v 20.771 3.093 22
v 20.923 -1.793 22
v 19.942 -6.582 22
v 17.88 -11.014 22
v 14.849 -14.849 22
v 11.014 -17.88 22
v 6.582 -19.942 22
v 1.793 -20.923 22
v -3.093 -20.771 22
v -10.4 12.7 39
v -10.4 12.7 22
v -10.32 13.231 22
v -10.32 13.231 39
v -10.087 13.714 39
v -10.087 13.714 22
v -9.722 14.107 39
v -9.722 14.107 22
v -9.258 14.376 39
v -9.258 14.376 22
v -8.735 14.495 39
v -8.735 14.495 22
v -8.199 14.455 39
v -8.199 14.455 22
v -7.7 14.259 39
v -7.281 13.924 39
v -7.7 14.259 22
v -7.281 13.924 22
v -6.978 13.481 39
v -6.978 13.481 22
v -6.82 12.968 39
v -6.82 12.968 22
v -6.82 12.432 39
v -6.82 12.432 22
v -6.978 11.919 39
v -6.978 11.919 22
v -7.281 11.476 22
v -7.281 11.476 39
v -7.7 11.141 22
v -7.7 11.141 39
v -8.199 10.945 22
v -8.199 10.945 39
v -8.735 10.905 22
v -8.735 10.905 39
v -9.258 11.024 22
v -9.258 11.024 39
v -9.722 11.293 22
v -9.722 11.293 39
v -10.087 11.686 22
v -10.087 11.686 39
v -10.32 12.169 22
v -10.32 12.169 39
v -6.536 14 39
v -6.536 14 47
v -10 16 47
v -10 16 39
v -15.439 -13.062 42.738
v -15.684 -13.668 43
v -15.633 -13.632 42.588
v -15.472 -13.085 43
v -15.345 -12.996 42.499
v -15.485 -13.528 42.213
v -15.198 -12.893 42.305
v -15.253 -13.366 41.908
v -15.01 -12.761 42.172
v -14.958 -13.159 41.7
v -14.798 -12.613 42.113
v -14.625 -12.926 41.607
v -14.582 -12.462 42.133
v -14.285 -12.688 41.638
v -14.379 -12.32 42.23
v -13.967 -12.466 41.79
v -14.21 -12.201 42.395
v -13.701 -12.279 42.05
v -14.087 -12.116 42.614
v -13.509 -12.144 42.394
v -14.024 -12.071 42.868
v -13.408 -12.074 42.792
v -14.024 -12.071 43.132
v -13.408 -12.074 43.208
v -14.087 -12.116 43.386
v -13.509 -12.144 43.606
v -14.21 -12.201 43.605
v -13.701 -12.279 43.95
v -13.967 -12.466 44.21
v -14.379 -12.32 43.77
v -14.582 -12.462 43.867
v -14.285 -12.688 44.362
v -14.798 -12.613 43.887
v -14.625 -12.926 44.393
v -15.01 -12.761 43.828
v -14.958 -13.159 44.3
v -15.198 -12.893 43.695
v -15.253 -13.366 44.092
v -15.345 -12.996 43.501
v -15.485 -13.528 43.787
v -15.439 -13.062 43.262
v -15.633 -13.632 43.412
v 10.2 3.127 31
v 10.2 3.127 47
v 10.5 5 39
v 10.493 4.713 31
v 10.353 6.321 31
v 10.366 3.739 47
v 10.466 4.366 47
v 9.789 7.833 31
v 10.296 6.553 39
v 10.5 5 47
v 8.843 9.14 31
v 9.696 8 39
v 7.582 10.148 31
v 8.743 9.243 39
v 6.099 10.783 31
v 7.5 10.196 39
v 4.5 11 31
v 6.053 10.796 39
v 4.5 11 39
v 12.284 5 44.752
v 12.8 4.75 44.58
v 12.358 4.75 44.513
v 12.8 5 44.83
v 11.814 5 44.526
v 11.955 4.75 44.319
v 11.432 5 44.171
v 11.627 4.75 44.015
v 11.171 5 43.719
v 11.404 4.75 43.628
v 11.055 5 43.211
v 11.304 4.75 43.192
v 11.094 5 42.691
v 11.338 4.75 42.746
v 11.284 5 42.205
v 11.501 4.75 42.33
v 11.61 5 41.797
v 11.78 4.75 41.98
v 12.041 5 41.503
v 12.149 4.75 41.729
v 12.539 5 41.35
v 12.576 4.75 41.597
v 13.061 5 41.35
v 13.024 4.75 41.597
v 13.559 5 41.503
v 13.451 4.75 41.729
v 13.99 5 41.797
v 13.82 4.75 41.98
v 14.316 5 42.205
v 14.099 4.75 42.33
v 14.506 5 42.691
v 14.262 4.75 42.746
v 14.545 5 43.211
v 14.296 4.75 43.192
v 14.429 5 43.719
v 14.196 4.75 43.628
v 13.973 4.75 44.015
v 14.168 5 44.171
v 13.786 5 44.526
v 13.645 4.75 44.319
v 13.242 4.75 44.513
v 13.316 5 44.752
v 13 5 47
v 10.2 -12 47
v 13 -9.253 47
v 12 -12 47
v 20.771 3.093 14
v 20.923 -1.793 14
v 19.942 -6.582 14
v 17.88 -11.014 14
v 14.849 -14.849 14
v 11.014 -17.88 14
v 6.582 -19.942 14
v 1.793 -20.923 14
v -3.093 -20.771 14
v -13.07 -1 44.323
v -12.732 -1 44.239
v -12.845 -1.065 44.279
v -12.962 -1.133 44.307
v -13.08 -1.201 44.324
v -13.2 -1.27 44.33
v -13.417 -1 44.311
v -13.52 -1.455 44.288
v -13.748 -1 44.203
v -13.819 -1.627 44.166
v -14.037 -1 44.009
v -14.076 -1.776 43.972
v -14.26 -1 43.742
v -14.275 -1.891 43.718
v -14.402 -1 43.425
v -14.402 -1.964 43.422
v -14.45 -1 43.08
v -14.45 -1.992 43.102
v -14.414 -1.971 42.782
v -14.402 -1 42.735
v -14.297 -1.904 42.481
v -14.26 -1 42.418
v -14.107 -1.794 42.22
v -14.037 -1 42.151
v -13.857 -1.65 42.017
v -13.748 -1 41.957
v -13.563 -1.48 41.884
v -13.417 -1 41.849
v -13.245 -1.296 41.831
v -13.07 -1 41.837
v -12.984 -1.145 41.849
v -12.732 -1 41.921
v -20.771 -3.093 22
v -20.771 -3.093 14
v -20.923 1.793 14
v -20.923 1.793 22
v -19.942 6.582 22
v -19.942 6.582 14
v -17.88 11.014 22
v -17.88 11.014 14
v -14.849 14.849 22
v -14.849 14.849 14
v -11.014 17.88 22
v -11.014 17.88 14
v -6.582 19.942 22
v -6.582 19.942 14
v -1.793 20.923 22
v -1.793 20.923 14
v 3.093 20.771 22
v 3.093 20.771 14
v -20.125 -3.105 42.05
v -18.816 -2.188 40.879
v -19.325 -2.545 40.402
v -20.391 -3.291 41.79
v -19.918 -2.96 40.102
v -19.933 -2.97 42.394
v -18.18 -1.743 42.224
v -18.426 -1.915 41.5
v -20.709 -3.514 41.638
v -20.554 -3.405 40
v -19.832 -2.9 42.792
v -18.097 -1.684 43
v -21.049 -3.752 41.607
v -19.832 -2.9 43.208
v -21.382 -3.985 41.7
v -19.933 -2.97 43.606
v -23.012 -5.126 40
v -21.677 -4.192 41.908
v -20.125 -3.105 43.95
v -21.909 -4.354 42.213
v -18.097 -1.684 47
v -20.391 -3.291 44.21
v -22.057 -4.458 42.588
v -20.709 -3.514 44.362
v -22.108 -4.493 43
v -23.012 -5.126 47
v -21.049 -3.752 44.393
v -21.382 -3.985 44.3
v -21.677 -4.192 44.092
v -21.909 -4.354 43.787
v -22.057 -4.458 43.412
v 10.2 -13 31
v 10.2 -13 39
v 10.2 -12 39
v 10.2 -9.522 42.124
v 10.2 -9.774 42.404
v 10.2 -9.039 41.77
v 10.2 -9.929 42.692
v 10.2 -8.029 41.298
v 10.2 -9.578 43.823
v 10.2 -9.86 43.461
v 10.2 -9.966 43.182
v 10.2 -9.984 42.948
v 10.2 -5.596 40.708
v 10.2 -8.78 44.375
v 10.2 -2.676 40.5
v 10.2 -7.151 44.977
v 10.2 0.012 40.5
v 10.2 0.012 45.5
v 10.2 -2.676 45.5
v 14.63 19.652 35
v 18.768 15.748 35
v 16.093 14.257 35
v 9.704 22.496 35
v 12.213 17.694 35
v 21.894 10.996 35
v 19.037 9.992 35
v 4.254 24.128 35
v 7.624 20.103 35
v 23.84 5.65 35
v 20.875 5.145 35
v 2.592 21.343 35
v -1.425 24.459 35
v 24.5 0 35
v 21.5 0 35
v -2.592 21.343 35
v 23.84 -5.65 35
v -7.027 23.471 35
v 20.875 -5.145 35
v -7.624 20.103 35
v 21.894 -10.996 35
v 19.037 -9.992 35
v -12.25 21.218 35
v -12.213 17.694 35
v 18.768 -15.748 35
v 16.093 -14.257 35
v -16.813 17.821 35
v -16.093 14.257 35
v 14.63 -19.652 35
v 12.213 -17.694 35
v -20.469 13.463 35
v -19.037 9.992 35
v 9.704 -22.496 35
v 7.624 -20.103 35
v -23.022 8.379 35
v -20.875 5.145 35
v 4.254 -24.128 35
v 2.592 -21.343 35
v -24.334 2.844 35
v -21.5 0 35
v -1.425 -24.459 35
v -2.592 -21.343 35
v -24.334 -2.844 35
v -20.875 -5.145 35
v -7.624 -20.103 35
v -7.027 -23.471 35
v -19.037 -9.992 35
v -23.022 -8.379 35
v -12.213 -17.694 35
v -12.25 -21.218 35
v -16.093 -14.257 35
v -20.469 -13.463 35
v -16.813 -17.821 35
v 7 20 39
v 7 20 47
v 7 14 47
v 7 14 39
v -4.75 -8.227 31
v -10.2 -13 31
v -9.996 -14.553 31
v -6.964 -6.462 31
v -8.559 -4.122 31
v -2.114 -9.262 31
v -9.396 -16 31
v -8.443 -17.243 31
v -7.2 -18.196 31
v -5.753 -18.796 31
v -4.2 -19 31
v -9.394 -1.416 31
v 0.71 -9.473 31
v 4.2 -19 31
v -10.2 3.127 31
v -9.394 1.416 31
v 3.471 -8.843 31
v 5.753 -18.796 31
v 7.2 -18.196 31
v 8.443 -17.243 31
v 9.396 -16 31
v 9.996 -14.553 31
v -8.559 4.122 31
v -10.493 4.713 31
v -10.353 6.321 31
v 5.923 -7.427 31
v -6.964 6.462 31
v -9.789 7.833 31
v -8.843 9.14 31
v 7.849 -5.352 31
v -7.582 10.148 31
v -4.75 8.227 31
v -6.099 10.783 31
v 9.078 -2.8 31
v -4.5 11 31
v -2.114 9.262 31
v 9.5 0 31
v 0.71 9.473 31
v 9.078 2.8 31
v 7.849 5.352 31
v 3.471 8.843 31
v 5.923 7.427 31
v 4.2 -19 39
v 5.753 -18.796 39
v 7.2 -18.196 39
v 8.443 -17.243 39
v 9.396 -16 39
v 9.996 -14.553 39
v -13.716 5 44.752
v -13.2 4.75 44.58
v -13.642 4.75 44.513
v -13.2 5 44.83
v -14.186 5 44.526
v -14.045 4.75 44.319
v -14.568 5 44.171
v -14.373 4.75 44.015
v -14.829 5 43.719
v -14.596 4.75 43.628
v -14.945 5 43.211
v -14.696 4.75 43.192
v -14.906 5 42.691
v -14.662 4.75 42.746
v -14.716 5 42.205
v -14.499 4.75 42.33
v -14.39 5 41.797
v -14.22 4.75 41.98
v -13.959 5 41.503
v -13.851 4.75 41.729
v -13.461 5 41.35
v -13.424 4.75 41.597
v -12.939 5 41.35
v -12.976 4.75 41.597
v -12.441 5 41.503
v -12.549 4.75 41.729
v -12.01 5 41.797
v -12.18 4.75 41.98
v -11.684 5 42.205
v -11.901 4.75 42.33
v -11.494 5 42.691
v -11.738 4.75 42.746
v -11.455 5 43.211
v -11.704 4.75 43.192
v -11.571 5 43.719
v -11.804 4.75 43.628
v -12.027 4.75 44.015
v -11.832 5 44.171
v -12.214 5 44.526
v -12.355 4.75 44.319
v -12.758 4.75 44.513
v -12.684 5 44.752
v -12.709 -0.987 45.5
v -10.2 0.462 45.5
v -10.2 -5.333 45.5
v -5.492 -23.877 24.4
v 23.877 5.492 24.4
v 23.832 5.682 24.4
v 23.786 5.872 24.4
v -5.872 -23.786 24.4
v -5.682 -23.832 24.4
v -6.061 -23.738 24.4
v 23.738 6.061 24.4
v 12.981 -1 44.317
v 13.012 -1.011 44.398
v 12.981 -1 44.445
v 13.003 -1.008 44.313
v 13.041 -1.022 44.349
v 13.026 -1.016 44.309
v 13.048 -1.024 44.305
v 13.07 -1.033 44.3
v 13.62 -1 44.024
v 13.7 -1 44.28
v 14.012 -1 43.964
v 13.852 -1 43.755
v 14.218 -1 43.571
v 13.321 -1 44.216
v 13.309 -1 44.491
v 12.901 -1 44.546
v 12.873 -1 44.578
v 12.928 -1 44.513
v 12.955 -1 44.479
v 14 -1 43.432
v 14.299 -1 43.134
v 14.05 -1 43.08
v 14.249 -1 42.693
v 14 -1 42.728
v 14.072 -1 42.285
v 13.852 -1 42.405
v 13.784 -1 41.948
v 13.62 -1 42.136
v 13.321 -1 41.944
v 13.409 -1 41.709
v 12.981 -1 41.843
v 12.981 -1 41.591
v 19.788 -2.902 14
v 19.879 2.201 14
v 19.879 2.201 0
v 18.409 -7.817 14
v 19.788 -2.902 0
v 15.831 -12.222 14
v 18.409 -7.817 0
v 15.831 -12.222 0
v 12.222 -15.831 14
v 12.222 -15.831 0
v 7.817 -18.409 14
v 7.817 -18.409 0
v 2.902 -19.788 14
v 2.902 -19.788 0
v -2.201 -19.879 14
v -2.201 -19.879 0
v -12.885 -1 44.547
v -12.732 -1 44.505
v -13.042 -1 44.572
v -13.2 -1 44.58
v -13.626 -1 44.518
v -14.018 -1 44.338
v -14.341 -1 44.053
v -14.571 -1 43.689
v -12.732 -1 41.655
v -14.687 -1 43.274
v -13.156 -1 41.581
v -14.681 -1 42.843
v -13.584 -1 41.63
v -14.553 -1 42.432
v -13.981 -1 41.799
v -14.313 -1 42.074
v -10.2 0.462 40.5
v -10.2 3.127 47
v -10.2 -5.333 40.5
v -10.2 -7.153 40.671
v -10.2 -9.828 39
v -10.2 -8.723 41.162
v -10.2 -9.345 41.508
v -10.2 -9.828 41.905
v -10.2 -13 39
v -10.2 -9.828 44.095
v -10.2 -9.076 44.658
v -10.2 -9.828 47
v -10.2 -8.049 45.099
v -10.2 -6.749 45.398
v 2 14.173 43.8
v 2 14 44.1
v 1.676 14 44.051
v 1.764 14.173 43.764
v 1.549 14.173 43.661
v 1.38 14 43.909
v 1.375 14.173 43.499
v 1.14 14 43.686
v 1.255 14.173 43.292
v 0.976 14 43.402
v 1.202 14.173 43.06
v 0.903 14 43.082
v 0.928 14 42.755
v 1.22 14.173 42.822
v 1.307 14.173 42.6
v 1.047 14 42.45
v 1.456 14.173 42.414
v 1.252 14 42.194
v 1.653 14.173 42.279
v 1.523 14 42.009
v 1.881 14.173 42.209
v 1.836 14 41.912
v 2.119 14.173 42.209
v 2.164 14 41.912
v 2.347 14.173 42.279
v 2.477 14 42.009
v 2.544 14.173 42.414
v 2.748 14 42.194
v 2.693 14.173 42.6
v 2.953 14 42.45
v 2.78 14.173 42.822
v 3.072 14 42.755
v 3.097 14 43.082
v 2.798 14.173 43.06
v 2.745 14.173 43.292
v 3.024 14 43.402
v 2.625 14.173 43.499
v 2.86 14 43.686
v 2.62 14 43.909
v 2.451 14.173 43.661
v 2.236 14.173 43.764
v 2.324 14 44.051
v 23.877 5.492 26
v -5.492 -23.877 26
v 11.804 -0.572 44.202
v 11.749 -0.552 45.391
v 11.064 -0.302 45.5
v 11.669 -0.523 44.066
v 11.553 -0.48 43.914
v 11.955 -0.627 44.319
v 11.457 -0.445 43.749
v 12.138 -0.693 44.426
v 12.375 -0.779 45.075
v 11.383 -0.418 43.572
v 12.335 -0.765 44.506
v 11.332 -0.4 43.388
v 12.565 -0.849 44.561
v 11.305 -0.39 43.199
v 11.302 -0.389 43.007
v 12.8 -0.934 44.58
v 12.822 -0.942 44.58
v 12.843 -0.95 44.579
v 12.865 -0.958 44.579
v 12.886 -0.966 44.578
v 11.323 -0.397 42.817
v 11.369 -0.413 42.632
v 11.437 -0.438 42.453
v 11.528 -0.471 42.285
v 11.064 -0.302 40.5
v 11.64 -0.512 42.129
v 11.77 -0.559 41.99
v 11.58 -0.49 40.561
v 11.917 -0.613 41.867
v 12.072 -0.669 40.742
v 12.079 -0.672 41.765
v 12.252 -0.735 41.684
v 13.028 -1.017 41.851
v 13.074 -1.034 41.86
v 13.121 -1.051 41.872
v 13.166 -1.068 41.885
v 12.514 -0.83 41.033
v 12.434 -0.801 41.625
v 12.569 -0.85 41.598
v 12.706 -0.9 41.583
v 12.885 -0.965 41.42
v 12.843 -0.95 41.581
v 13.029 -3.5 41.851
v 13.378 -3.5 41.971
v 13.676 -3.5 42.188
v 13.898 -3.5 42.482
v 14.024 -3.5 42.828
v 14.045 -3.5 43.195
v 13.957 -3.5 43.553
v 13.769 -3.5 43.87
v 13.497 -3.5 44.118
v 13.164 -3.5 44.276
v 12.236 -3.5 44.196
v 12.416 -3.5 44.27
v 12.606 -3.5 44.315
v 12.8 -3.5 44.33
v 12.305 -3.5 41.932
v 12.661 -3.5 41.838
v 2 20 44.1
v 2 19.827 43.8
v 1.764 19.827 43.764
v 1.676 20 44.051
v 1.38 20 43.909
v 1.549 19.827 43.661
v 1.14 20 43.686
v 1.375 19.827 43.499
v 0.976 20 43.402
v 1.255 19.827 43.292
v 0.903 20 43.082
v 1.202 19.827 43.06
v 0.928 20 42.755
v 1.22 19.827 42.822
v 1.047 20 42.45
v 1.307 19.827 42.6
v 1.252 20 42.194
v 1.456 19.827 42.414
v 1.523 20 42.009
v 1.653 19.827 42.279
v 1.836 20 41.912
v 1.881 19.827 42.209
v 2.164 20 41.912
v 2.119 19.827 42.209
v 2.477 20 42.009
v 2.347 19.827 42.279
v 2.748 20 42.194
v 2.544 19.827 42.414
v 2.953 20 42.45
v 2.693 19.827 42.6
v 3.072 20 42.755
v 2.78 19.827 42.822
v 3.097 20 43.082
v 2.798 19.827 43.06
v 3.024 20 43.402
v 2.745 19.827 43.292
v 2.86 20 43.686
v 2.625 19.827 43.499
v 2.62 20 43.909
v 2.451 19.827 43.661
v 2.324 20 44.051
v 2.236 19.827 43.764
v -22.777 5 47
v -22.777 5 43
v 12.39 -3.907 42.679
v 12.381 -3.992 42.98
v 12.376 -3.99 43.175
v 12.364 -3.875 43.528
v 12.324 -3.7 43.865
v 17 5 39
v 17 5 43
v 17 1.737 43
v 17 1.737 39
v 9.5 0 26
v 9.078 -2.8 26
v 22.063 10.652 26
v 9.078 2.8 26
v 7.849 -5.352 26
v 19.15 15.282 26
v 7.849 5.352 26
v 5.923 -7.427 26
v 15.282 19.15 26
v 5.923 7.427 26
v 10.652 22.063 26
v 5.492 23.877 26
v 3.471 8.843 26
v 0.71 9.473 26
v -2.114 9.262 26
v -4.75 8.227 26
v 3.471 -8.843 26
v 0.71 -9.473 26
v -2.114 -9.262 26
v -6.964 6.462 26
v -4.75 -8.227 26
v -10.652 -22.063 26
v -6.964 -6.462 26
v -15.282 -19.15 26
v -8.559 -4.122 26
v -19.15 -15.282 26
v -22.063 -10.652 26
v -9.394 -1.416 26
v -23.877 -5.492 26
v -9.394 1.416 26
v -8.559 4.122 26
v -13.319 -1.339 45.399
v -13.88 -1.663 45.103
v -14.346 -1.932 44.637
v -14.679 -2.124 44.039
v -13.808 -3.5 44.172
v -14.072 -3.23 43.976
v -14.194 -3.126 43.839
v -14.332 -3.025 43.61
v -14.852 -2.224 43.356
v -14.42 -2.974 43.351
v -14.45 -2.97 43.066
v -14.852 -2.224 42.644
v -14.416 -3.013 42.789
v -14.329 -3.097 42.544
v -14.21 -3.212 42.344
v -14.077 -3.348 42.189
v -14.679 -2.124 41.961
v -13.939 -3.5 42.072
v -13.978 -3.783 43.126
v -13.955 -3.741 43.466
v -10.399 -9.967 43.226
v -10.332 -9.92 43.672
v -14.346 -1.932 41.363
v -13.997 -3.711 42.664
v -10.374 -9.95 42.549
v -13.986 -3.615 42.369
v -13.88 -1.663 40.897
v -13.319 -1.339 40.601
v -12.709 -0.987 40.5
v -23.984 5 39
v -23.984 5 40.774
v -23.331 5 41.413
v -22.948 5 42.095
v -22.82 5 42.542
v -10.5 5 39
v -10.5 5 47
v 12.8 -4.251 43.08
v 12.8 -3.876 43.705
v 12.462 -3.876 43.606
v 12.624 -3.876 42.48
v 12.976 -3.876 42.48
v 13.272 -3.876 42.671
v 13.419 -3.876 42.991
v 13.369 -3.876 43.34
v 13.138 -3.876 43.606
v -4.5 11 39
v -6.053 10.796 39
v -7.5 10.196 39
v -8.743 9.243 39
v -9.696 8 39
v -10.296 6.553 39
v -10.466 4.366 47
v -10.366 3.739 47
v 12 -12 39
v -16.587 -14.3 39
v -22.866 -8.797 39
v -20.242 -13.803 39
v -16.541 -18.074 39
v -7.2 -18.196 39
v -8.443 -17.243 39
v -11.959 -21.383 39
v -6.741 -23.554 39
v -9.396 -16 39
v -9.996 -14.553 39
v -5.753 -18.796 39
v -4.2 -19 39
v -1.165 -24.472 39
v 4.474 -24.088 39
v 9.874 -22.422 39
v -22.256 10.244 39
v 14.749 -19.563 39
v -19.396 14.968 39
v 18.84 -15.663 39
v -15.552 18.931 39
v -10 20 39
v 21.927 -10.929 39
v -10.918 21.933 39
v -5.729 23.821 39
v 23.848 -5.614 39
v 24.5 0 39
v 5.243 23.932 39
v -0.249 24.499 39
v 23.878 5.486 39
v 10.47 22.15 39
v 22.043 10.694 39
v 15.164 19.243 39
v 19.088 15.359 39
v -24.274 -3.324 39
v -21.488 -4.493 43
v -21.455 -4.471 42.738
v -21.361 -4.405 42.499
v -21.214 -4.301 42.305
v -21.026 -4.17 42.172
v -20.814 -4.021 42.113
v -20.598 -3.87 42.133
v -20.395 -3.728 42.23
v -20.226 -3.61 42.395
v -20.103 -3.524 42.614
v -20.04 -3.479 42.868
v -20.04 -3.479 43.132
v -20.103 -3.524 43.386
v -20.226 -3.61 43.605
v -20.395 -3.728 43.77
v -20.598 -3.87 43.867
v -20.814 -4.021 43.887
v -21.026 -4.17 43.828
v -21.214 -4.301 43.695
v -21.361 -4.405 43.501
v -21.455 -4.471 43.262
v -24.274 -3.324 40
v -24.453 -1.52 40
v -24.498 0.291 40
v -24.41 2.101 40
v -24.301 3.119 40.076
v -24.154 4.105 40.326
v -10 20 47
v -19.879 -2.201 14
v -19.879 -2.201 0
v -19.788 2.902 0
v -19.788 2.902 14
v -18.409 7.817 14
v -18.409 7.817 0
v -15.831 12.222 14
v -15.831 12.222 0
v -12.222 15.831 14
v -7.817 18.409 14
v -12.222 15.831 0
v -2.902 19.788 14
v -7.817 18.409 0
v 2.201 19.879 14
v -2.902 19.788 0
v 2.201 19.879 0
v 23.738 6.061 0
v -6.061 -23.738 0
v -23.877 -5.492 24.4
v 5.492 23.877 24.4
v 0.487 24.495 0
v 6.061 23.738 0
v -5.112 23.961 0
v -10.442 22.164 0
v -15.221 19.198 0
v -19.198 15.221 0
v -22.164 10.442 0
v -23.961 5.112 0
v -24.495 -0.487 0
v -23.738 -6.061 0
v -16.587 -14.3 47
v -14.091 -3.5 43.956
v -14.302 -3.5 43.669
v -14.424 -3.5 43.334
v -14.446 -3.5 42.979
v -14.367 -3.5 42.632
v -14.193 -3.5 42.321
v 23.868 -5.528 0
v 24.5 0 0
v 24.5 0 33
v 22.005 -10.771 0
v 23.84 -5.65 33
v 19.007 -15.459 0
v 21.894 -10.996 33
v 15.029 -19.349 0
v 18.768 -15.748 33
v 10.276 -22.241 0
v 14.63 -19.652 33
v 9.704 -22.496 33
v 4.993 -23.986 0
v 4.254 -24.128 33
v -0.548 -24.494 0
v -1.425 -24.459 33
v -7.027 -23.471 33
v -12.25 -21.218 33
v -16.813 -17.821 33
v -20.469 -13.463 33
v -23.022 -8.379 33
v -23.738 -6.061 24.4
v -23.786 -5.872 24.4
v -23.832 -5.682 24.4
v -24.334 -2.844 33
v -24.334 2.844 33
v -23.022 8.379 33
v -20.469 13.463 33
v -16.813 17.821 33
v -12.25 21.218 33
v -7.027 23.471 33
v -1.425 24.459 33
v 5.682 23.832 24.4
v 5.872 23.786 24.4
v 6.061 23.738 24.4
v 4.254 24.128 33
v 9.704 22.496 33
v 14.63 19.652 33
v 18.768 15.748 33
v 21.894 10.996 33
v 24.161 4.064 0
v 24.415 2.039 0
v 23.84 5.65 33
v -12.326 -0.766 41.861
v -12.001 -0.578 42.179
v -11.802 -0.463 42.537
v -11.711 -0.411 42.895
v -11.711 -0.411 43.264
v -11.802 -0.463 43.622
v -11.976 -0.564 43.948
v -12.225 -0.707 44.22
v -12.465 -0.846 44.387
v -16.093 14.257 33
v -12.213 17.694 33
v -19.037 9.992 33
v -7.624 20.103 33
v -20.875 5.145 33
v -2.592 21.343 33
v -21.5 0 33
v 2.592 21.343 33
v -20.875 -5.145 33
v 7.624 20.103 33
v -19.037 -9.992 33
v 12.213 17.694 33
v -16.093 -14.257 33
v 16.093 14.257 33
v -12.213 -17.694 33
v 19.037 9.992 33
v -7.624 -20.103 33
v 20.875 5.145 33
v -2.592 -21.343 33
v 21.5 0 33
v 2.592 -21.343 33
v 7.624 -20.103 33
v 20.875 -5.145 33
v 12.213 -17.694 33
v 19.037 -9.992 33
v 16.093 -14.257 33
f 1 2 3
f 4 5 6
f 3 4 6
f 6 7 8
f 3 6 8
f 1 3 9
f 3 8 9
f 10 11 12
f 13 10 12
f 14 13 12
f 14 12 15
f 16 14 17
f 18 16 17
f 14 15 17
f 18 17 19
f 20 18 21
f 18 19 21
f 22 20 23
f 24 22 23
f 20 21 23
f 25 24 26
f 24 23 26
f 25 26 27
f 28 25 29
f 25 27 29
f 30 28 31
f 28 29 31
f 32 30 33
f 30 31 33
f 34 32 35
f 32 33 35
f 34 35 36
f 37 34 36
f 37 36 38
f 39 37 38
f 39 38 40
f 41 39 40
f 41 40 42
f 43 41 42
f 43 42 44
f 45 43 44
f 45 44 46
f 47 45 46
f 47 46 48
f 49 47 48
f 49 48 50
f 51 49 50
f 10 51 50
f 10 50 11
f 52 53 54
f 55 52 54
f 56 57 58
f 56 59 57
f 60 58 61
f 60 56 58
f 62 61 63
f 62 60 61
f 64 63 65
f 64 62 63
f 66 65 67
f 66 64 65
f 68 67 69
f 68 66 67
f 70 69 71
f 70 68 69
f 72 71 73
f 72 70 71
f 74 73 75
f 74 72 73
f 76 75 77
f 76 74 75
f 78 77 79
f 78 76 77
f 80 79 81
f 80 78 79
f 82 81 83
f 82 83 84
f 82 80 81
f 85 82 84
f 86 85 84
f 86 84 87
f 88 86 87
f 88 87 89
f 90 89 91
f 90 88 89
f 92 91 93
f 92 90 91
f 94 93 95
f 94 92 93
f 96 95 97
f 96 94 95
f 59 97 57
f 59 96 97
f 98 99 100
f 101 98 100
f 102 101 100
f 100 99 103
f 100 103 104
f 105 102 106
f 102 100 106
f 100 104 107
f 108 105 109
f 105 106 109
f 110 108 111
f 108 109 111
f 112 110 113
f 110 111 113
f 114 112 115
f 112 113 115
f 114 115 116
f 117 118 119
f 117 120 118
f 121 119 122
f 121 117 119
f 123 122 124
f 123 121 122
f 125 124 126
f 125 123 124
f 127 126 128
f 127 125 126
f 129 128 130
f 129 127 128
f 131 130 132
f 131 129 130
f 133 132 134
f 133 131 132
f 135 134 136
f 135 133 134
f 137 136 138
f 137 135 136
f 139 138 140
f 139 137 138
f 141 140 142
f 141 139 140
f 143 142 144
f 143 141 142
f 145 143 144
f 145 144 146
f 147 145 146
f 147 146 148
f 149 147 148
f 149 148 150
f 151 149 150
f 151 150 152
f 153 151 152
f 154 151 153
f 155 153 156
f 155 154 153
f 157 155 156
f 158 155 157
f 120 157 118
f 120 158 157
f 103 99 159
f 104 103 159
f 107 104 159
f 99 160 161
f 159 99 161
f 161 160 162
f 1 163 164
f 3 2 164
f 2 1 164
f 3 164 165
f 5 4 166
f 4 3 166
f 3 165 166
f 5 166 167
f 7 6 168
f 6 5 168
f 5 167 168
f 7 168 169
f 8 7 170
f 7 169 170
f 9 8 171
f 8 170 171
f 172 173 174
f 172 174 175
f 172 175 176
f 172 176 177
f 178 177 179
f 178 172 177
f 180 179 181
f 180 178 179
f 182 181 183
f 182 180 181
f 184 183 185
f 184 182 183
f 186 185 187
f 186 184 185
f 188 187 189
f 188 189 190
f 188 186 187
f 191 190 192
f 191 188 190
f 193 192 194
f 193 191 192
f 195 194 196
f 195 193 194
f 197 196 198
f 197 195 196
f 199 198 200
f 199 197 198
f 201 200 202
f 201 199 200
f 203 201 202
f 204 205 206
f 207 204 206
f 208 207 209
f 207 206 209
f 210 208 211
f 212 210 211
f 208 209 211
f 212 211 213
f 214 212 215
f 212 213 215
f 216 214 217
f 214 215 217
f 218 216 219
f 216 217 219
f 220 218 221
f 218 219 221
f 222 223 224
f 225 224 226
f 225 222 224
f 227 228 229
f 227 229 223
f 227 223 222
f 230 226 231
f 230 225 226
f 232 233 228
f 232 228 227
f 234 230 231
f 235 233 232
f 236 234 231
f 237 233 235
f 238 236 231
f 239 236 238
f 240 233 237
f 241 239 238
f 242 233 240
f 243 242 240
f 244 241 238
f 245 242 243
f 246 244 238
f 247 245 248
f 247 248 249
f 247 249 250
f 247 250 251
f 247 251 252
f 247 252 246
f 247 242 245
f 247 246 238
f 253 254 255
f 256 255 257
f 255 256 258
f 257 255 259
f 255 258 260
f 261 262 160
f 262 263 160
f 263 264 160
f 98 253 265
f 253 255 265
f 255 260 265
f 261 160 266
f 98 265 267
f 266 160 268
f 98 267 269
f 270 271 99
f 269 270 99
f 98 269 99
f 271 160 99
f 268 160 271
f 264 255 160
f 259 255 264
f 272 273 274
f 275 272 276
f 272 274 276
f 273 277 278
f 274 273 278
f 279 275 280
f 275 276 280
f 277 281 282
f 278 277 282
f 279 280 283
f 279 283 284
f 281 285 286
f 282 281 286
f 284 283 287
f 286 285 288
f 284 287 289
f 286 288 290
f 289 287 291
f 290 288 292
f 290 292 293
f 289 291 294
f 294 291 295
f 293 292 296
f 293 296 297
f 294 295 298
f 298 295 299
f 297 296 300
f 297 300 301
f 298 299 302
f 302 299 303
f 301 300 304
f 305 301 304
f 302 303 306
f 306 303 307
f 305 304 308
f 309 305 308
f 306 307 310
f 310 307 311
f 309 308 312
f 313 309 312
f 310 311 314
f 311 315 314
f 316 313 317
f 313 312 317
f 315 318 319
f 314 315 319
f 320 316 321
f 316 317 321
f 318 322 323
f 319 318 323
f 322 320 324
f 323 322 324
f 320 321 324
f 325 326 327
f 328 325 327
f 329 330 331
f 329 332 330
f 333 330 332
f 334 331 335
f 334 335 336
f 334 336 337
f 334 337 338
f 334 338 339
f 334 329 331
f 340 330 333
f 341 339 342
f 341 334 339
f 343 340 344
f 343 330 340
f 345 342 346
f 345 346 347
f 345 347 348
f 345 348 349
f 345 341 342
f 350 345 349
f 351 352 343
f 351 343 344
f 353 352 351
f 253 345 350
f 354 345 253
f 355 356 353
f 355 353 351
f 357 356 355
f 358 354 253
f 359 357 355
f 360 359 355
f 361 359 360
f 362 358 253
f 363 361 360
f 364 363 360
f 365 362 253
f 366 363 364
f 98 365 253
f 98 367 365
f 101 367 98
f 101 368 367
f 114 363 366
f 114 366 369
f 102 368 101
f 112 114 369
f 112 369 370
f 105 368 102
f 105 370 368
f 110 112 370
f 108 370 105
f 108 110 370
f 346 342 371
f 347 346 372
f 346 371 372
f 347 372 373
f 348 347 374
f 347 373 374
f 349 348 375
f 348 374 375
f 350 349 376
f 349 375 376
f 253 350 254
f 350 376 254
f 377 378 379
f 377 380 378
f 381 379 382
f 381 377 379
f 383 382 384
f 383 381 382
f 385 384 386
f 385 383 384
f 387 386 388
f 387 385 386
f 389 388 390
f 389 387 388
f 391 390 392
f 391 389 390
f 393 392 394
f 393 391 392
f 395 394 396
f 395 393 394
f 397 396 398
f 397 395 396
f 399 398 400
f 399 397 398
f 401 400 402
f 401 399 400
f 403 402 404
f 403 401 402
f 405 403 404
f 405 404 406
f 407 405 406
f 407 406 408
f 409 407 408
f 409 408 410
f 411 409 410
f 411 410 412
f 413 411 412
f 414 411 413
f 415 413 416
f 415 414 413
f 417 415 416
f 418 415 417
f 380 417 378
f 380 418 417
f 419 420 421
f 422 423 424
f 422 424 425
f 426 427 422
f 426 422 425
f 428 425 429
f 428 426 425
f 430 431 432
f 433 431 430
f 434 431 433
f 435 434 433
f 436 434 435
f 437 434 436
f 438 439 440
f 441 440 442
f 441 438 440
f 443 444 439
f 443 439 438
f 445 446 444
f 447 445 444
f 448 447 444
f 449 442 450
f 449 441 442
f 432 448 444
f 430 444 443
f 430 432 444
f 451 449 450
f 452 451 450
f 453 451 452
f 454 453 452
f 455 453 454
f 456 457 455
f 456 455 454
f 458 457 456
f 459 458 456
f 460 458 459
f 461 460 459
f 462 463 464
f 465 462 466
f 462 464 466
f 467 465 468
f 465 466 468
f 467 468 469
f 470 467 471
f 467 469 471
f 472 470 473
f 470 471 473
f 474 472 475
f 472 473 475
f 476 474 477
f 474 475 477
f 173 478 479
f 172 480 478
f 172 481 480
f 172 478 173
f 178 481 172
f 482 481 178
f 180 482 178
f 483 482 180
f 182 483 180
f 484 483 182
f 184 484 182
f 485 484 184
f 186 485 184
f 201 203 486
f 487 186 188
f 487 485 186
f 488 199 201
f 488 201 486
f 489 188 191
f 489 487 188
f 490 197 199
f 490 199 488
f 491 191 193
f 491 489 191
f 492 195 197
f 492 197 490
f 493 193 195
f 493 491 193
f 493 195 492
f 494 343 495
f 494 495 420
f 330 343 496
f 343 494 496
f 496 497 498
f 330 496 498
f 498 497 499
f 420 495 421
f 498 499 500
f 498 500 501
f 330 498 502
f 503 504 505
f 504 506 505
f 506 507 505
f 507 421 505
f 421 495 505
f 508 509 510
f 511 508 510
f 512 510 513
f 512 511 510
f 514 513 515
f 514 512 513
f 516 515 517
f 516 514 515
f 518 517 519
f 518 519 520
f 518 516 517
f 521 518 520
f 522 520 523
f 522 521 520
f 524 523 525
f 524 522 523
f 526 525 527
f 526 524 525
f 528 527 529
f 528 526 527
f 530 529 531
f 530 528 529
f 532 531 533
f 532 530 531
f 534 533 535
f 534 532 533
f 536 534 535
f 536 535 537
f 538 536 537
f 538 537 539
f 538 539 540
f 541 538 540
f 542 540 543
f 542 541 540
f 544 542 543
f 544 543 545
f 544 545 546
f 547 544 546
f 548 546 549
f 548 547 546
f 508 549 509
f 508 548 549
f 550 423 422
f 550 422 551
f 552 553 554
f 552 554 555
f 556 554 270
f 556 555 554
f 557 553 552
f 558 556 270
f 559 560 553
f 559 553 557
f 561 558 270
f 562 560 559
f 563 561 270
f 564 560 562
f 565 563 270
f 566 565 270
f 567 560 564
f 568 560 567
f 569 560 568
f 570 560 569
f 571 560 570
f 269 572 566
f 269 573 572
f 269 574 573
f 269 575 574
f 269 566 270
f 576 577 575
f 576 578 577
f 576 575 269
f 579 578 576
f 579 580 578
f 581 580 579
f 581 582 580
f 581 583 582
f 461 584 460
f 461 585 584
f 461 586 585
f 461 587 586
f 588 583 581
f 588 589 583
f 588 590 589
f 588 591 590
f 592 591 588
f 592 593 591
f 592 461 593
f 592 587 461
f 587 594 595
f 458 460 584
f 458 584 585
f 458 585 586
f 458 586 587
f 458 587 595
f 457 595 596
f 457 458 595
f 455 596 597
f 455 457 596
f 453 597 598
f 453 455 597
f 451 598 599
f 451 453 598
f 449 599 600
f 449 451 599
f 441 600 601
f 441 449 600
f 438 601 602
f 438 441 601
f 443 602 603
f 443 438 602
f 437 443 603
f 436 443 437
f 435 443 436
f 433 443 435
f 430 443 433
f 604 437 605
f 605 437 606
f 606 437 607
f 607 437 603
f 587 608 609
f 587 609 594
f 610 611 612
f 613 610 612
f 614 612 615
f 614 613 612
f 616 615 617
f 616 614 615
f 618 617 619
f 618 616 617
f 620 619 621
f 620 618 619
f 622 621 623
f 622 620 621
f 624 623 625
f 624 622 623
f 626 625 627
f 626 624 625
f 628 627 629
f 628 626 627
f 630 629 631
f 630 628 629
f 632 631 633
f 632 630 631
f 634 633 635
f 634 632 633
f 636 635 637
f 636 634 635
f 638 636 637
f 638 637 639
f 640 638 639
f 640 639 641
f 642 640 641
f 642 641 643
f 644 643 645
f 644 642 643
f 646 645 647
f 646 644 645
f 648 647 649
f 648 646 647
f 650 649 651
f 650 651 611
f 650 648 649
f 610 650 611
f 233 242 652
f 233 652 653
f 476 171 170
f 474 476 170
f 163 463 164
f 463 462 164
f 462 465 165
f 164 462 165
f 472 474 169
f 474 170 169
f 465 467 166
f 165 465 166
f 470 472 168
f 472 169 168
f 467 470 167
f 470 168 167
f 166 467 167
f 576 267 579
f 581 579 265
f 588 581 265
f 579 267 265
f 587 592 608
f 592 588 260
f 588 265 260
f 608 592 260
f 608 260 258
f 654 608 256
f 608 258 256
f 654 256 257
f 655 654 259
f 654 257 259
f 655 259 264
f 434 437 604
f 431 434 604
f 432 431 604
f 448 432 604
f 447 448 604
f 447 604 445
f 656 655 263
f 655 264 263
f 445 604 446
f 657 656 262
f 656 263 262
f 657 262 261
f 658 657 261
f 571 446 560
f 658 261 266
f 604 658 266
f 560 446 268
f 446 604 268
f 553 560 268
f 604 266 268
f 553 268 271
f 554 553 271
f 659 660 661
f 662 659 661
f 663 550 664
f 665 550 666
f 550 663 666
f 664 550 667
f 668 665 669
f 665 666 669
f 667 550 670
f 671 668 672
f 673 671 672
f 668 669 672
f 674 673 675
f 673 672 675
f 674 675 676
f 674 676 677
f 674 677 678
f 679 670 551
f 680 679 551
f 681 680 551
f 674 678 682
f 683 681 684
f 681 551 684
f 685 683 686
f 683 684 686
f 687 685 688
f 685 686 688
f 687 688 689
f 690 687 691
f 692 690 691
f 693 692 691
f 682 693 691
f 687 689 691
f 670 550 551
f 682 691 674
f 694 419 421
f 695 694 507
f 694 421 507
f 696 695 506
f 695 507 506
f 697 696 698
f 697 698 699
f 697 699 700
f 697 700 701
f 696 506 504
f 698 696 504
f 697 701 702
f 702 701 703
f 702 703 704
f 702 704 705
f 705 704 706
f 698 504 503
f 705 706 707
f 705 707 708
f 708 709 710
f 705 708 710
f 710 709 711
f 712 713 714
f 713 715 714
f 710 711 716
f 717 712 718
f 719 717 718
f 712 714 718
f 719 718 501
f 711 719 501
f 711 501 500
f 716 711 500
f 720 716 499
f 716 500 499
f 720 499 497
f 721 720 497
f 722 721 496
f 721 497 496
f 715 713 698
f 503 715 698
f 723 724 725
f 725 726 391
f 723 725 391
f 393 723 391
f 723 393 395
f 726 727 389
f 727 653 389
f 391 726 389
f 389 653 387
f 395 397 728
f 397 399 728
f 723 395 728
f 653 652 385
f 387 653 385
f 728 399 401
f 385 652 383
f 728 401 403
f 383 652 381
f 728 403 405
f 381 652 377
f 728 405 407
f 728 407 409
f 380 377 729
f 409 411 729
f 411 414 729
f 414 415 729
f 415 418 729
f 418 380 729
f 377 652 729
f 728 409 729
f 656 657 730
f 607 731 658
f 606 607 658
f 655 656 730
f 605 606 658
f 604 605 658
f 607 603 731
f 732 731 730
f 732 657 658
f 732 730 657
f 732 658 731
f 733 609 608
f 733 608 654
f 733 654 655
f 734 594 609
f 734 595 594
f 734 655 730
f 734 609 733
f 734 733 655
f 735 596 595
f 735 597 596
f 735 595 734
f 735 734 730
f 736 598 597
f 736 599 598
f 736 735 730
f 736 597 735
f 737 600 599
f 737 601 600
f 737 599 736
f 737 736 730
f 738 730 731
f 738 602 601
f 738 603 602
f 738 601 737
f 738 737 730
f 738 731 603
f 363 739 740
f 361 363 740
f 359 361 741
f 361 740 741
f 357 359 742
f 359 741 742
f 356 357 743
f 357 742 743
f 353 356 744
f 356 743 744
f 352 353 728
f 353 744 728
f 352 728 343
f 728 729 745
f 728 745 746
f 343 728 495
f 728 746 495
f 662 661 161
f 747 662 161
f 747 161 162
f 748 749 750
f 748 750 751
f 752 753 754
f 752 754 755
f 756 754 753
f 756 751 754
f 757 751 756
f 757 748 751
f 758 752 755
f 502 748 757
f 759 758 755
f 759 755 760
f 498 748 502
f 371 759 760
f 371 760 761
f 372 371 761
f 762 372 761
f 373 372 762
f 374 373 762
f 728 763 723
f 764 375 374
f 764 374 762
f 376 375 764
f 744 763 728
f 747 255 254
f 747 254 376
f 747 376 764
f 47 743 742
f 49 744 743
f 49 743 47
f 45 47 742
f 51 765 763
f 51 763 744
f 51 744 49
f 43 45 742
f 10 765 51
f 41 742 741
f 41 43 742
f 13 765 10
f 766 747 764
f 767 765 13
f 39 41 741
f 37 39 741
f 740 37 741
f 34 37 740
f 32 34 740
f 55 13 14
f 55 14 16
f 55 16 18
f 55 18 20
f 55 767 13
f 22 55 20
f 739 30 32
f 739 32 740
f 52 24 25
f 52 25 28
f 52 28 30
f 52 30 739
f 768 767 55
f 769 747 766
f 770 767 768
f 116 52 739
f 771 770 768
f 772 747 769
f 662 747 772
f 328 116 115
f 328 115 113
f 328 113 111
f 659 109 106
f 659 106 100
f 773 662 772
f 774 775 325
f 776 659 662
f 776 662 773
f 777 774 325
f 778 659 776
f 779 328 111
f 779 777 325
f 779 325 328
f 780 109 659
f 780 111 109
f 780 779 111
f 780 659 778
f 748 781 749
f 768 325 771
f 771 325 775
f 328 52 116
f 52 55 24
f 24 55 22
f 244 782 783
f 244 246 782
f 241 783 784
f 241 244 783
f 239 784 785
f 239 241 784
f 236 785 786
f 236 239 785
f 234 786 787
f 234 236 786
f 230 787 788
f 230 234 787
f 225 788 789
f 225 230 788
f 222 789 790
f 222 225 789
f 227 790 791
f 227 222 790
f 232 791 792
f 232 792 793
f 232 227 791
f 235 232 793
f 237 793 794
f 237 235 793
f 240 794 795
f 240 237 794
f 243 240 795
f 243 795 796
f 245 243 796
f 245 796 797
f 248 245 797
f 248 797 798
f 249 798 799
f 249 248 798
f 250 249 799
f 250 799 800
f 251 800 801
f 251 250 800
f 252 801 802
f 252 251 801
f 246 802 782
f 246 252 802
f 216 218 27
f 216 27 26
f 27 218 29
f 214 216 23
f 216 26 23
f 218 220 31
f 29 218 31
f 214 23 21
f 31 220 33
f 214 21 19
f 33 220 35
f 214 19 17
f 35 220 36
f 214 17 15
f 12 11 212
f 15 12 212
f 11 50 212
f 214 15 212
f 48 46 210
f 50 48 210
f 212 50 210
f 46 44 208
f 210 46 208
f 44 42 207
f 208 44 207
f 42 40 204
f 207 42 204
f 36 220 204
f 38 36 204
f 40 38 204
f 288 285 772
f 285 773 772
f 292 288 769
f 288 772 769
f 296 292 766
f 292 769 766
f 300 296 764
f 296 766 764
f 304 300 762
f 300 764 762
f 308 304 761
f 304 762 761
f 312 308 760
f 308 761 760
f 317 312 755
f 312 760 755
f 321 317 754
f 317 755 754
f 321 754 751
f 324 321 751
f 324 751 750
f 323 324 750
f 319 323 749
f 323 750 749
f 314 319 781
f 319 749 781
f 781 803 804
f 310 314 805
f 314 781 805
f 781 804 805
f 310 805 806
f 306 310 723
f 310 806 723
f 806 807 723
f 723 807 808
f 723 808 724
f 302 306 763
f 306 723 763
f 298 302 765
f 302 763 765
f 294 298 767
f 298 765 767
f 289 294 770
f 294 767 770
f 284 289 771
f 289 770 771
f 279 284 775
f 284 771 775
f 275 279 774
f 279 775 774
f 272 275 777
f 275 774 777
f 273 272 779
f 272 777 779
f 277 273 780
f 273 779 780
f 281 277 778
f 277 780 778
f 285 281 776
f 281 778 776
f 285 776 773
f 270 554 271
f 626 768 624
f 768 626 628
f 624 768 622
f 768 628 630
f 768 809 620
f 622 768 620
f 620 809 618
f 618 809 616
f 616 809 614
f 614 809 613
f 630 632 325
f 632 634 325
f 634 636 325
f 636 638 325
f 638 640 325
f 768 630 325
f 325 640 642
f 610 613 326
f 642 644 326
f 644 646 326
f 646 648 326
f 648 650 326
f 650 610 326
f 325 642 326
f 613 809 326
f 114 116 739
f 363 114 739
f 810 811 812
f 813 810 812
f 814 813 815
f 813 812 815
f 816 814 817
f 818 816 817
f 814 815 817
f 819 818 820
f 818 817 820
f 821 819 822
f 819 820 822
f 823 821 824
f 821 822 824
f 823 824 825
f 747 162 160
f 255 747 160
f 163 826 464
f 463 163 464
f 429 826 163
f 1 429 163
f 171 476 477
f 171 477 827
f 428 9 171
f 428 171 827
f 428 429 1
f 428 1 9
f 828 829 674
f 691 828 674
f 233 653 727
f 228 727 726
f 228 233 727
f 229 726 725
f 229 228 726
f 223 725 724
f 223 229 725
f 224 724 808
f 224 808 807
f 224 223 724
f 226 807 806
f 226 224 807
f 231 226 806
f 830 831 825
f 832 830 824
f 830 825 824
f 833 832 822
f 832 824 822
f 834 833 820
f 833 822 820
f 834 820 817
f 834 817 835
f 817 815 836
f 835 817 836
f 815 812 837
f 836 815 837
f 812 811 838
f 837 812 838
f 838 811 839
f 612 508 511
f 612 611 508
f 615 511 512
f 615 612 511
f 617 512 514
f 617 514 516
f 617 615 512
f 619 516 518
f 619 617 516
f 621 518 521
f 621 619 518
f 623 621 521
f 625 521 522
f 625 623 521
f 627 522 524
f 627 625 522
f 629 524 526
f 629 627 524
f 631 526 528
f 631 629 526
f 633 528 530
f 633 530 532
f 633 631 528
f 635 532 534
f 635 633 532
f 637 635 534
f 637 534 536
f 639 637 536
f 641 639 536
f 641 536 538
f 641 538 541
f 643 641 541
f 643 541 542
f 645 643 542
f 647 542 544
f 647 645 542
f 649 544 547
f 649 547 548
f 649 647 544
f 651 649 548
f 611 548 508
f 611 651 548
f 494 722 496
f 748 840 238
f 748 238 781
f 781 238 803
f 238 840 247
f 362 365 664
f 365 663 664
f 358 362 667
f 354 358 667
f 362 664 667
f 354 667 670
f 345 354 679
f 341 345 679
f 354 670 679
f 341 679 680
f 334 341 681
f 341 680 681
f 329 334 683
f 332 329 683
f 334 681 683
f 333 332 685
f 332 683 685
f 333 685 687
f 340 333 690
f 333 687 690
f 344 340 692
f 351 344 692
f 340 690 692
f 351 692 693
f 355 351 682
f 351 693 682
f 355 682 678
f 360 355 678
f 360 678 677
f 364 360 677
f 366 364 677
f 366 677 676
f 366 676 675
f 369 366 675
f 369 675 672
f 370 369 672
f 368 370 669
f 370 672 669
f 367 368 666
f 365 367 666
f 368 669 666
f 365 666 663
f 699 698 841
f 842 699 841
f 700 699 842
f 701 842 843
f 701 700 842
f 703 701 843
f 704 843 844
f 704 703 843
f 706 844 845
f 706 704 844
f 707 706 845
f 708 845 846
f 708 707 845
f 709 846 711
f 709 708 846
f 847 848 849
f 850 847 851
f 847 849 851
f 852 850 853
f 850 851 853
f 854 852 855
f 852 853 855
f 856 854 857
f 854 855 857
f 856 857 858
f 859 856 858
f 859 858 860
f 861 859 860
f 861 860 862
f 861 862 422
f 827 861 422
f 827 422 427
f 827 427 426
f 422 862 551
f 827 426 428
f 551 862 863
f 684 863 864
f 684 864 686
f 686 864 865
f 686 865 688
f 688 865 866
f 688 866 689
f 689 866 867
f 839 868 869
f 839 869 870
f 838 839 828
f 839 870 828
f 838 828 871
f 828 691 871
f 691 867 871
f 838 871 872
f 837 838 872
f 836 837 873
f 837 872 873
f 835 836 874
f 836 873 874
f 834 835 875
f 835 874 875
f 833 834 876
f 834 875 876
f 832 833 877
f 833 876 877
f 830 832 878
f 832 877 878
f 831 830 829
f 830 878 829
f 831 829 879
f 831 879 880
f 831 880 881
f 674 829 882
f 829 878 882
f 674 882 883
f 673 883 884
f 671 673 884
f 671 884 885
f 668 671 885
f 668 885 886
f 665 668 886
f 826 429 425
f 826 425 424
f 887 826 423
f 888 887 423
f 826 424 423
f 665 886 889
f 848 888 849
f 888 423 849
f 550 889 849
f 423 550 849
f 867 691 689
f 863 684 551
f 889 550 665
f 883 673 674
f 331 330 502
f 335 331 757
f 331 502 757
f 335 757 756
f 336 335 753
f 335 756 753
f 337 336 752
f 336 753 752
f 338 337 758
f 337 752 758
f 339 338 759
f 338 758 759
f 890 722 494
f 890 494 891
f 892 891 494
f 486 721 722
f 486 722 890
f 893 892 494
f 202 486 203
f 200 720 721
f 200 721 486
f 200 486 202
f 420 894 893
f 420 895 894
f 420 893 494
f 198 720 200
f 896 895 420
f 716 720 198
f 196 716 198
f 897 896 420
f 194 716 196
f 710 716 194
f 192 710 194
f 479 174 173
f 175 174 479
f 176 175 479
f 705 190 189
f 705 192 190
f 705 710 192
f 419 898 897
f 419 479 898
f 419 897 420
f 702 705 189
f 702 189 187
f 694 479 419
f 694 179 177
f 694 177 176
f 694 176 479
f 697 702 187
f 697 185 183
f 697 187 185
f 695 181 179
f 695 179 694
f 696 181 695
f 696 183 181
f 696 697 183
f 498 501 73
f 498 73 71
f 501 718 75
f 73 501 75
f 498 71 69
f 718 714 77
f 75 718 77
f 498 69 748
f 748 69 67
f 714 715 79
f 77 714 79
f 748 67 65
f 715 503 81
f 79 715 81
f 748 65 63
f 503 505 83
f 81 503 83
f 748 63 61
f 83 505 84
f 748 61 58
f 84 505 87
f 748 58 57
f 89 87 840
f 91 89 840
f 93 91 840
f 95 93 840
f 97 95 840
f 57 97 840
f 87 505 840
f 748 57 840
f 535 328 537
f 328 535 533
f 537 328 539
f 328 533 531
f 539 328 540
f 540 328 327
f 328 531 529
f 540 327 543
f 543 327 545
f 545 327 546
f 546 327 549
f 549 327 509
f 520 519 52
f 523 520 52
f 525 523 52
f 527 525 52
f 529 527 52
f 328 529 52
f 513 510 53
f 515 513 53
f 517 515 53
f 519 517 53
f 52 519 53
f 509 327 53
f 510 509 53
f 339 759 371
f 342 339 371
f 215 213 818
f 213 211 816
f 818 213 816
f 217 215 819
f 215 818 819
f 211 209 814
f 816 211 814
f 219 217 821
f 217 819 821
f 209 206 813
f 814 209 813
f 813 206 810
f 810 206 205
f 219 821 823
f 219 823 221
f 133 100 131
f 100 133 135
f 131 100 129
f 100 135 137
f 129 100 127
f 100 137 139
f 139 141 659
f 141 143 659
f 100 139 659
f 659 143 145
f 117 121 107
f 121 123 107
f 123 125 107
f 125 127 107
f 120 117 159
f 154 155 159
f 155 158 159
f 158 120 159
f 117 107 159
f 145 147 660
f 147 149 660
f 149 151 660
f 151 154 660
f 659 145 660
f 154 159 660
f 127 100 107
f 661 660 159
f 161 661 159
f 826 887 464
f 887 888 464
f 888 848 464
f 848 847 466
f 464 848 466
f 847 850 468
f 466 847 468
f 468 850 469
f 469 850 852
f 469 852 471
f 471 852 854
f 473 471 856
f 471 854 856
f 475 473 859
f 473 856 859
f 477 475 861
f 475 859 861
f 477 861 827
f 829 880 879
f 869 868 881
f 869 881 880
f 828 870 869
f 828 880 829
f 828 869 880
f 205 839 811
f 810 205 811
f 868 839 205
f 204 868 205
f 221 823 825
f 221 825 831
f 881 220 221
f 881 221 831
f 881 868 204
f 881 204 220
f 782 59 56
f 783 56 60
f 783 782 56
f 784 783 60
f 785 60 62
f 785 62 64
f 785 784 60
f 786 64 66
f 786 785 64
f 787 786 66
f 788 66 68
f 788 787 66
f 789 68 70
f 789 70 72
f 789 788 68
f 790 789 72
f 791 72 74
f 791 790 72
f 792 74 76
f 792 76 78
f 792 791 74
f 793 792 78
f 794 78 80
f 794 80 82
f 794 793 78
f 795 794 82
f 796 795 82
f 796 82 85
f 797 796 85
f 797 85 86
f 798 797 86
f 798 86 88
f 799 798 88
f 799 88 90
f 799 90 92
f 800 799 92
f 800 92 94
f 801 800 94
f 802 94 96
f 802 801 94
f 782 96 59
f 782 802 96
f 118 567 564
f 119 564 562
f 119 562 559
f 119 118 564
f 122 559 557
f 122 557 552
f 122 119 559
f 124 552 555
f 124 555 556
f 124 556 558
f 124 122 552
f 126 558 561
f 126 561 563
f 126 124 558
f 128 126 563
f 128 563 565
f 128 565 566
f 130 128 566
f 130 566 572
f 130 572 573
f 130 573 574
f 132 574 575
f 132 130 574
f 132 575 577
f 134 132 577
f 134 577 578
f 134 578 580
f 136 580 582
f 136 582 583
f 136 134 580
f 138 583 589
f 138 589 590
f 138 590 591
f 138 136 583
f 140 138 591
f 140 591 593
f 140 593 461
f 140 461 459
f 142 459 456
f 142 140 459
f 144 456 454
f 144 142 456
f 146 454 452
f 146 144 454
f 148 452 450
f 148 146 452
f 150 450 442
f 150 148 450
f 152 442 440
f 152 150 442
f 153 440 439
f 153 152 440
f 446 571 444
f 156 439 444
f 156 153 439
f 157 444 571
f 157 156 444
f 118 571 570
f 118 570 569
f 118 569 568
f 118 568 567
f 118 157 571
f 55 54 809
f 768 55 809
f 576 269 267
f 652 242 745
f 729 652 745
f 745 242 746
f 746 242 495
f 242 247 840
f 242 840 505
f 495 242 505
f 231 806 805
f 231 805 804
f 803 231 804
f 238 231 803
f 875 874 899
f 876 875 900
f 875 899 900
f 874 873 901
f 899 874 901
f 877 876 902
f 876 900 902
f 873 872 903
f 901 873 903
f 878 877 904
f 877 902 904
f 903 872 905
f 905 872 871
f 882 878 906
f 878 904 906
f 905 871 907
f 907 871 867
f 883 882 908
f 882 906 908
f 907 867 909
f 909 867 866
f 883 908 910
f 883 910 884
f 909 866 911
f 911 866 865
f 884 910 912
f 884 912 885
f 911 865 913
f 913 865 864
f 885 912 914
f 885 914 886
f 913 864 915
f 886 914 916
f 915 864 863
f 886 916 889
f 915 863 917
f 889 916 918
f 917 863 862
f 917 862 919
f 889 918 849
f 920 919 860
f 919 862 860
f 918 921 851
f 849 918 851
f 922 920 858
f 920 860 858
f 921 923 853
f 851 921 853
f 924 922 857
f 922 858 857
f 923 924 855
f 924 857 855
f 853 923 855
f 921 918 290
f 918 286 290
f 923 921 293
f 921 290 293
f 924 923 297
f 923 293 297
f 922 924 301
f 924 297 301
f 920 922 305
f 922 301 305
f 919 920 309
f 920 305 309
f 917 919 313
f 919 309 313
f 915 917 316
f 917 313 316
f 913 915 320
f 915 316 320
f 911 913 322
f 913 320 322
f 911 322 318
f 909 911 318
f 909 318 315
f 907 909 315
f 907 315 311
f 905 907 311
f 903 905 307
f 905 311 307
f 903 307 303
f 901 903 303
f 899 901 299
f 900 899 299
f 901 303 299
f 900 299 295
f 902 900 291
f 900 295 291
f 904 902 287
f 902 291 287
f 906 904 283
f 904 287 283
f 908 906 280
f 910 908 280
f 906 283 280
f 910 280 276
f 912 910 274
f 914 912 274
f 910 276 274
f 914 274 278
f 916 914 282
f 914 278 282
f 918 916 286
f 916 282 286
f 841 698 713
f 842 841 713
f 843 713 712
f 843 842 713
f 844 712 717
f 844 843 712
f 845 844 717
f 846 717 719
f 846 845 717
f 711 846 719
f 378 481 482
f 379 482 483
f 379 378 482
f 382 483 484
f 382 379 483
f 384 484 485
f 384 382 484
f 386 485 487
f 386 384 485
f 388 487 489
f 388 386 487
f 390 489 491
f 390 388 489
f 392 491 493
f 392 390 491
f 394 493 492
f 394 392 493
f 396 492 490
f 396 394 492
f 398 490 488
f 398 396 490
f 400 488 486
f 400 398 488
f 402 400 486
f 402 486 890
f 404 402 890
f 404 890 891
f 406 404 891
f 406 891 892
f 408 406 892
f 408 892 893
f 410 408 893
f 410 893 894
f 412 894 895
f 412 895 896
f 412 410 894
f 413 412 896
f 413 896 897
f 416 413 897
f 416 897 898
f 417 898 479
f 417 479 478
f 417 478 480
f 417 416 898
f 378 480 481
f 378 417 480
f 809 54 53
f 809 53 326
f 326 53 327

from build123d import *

# Parameters (mm, degrees)
CUT_EXTRUDE_7_DEPTH        = 16
CUT_EXTRUDE_START          = -25.5
CUT_EXTRUDE_3_OUTLINE_R    = 9.5
CUT_EXTRUDE_3_DEPTH        = 25.5
CUT_EXTRUDE_4_DEPTH        = 8
SKETCH_18_R                = 1.25
CUT_EXTRUDE_10_DEPTH       = 5
HOLE_WIZARD_M31_AT_2_COUNT = 2
HOLE_WIZARD_M31_AT_2_PITCH = 26
CHAMFER_1_SIZE             = 4
SKETCH_20_R                = 1.8
CUT_EXTRUDE_1_DEPTH        = 43.725870383
CUT_EXTRUDE_12_DEPTH       = 15
CUT_EXTRUDE_13_DEPTH       = 13
CUT_EXTRUDE_START_2        = -11.2
CUT_EXTRUDE_14_DEPTH       = 16
CUT_EXTRUDE_15_DEPTH       = 59.390924036
CUT_EXTRUDE_15_DEPTH_BACK  = 59.390924036
SKETCH_30_W                = 26
SKETCH_30_H                = 1.6


# Read off the part's stored shape, not the designer's step: the extrude step
with BuildPart() as part:
    # Sketch 2 → Revolve 2 (revolve)
    with BuildSketch(Plane(origin=(0, 0, 0), x_dir=(0, 0, -1), z_dir=(1, 0, 0)), mode=Mode.PRIVATE) as revolve_2_sk:
        Polygon((-47, 9.5), (-22, 9.5), (-22, 21), (-14, 21), (-14, 20), (0, 20), (0, 24.5), (-33, 24.5), (-33, 21.5), (-35, 21.5), (-35, 24.5), (-47, 24.5), align=None)
    revolve(revolve_2_sk.sketch.rotate(Axis((0, 0, 0), (0, 0, -1)), 90), axis=Axis((0, 0, 0), (0, 0, -1)))

    # Sketch 11 → Cut-Extrude 7 (cut)
    with BuildSketch(Plane.XY.offset(47)):
        with BuildLine():
            Line((-4.2, -19), (4.2, -19))
            ThreePointArc((4.2, -19), (8.442640687, -17.242640687), (10.2, -13))
            Line((10.2, -13), (10.2, 3.1265006))
            ThreePointArc((10.2, 3.1265006), (9.360092406, 8.51845162), (4.5, 11))
            Line((4.5, 11), (-4.5, 11))
            ThreePointArc((-4.5, 11), (-9.360092406, 8.51845162), (-10.2, 3.1265006))
            Line((-10.2, 3.1265006), (-10.2, -13))
            ThreePointArc((-10.2, -13), (-8.442640687, -17.242640687), (-4.2, -19))
        make_face()
    extrude(amount=-CUT_EXTRUDE_7_DEPTH, mode=Mode.SUBTRACT)

    # Cut-Extrude 3 outline → Cut-Extrude 3 (cut)
    with BuildSketch(Plane(origin=(0, 0, 0), x_dir=(-1, 0, 0), z_dir=(0, 0, -1)).offset(CUT_EXTRUDE_START)):
        with BuildLine():
            ThreePointArc((6.060829661, -23.738499191), (17.324116139, -17.324116139), (23.738499191, -6.060829661))
            Line((23.738499191, -6.060829661), (-6.060829661, 23.738499191))
            ThreePointArc((-6.060829661, 23.738499191), (-17.324116139, 17.324116139), (-23.738499191, 6.060829661))
            Line((-23.738499191, 6.060829661), (6.060829661, -23.738499191))
        make_face()
        Circle(CUT_EXTRUDE_3_OUTLINE_R, mode=Mode.SUBTRACT)
    extrude(amount=CUT_EXTRUDE_3_DEPTH, mode=Mode.SUBTRACT)

    # Sketch 5 → Cut-Extrude 4 (cut)
    with BuildSketch(Plane.XY.offset(47)):
        with BuildLine():
            Line((17, 5), (17, 1.737387097))
            Line((17, 1.737387097), (12, -12))
            Line((12, -12), (10.2, -12))
            Line((10.2, -12), (10.2, -13))
            ThreePointArc((10.2, -13), (8.442640687, -17.242640687), (4.2, -19))
            Line((4.2, -19), (-4.2, -19))
            ThreePointArc((-4.2, -19), (-8.442640687, -17.242640687), (-10.2, -13))
            Line((-10.2, -13), (-10.2, -9.827820985))
            Line((-10.2, -9.827820985), (-16.587454885, -14.300365046))
            Line((-16.587454885, -14.300365046), (-24.273530206, -3.323511896))
            ThreePointArc((-24.273530206, -3.323511896), (1.66560949, -24.443316981), (24.5, 0))
            ThreePointArc((24.5, 0), (2.513258562, 24.370751556), (-23.98436991, 5))
            Line((-23.98436991, 5), (-10.5, 5))
            ThreePointArc((-10.5, 5), (-8.742640687, 9.242640687), (-4.5, 11))
            Line((-4.5, 11), (4.5, 11))
            ThreePointArc((4.5, 11), (8.742640687, 9.242640687), (10.5, 5))
            Line((10.5, 5), (17, 5))
        make_face()
        Polygon((-10, 20), (7, 20), (7, 14), (-6.535898385, 14), (-10, 16), align=None, mode=Mode.SUBTRACT)
    extrude(amount=-CUT_EXTRUDE_4_DEPTH, mode=Mode.SUBTRACT)

    # Sketch 18 → Cut-Extrude 10 (cut)
    with BuildSketch(Plane(origin=(0, 5, 0), x_dir=(1, 0, 0), z_dir=(0, 1, 0))):
        with Locations(Location((-13.2, -43.08, 0), (0, 0, 180))):
            Circle(SKETCH_18_R)
        with Locations(Location((12.8, -43.08, 0), (0, 0, 180))):
            Circle(SKETCH_18_R)
    extrude(amount=-CUT_EXTRUDE_10_DEPTH, mode=Mode.SUBTRACT)

    # Sketch 24 → Hole Wizard M31 (revolve, cut)
    with BuildSketch(Plane(origin=(-13.2, 5, 43.08), x_dir=(0, 0, 1), z_dir=(1, 0, 0))):
        Polygon((0, 0), (0, 9.251075774), (1.25, 8.5), (1.25, 6), (1.5, 6), (1.5, 0.25), (1.75, 0), align=None)
    hole_wizard_m31 = revolve(axis=Axis((-13.2, 11.35, 43.08), (0, -1, 0)), mode=Mode.SUBTRACT)

    # Hole Wizard M31 at 2: Hole Wizard M31 ×2
    with Locations(*[(i * HOLE_WIZARD_M31_AT_2_PITCH, 0, 0) for i in range(1, HOLE_WIZARD_M31_AT_2_COUNT)]):
        add(hole_wizard_m31, mode=Mode.SUBTRACT)

    # Chamfer 1
    chamfer_1_edges = [part.edges().sort_by_distance(p)[0] for p in [
        (17, 3.368693549, 47),
    ]]
    chamfer(chamfer_1_edges, length=CHAMFER_1_SIZE)

    # Sketch 20 → Cut-Extrude 1 (cut, through all)
    with BuildSketch(Plane(origin=(0, 0, 22), x_dir=(-1, 0, 0), z_dir=(0, 0, -1))):
        with Locations((8.6, 12.7)):
            Circle(SKETCH_20_R)
    extrude(amount=-CUT_EXTRUDE_1_DEPTH, mode=Mode.SUBTRACT)

    # Sketch 21 → Hole Wizard M21 (revolve, cut)
    with BuildSketch(Plane(origin=(2, 20, 43), x_dir=(0, 0, 1), z_dir=(1, 0, 0))):
        Polygon((0, 0), (0, 6), (1.1, 6), (0.8, 5.826794919), (0.8, 0.173205081), (1.1, 0), align=None)
    revolve(axis=Axis((2, 26.35, 43), (0, -1, 0)), mode=Mode.SUBTRACT)

    # Sketch 23 → Cut-Extrude 12 (cut)
    with BuildSketch(Plane(origin=(4.75, -8.227241336, 0), x_dir=(0, 0, -1), z_dir=(-0.499999999999998, 0.8660254037844398, 0))):
        with BuildLine():
            Line((-40.5, 11.5), (-40.5, 4.634817269))
            Line((-40.5, 4.634817269), (-45.5, 4.634817269))
            Line((-45.5, 4.634817269), (-45.5, 11.5))
            ThreePointArc((-45.5, 11.5), (-43, 14), (-40.5, 11.5))
        make_face()
    extrude(amount=CUT_EXTRUDE_12_DEPTH, mode=Mode.SUBTRACT)

    # Sketch 26 → Cut-Extrude 13 (cut)
    with BuildSketch(Plane(origin=(-3.249191362, -8.927079897, 0), x_dir=(0, 0, 1), z_dir=(0.3420201433256694, 0.9396926207859083, 0))):
        with BuildLine():
            Line((45.5, 10.5), (45.5, 4.710471755))
            Line((45.5, 4.710471755), (40.5, 4.710471755))
            Line((40.5, 4.710471755), (40.5, 10.5))
            ThreePointArc((40.5, 10.5), (43, 13), (45.5, 10.5))
        make_face()
    extrude(amount=CUT_EXTRUDE_13_DEPTH, mode=Mode.SUBTRACT)

    # Sketch 27 → Cut-Extrude 14 (cut)
    with BuildSketch(Plane(origin=(1.26186816, -1.802134497, 0), x_dir=(0.8191520442889928, 0.5735764363510447, 0), z_dir=(0.5735764363510447, -0.8191520442889928, 0)).offset(CUT_EXTRUDE_START_2)):
        with BuildLine():
            Line((-18.79, 40), (-27.979598057, 40))
            Line((-27.979598057, 40), (-27.979598057, 48.487247608))
            Line((-27.979598057, 48.487247608), (-15.79, 48.487247608))
            Line((-15.79, 48.487247608), (-15.79, 43))
            ThreePointArc((-15.79, 43), (-16.668679656, 40.878679656), (-18.79, 40))
        make_face()
    extrude(amount=-CUT_EXTRUDE_14_DEPTH, mode=Mode.SUBTRACT)

    # Sketch 28 → Hole Wizard 2-561 (revolve, cut)
    with BuildSketch(Plane(origin=(-20.963630861, -3.691921059, 43), x_dir=(-0.8191520442889927, -0.5735764363510447, 0), z_dir=(0, 0, 1))):
        Polygon((0, 0), (0, 11.2), (1.397, 11.2), (0.889, 10.844294571), (0.889, 0.355705429), (1.397, 0), align=None)
    revolve(axis=Axis((-24.605841232, 1.509694423, 43), (0.5735764363510447, -0.8191520442889927, 0)), mode=Mode.SUBTRACT)

    # Sketch 30 → Cut-Extrude 15 (cut, two sides: drawn at the far end of the back side and taken through both)
    with BuildSketch(Plane(origin=(0, 0, 0), x_dir=(-0.7071067811865464, 0.7071067811865488, 0), z_dir=(0.7071067811865488, 0.7071067811865464, 0)).offset(-CUT_EXTRUDE_15_DEPTH_BACK)):
        with Locations((0, 25.2)):
            Rectangle(SKETCH_30_W, SKETCH_30_H)
    extrude(amount=CUT_EXTRUDE_15_DEPTH + CUT_EXTRUDE_15_DEPTH_BACK, mode=Mode.SUBTRACT)


solid = part.part
